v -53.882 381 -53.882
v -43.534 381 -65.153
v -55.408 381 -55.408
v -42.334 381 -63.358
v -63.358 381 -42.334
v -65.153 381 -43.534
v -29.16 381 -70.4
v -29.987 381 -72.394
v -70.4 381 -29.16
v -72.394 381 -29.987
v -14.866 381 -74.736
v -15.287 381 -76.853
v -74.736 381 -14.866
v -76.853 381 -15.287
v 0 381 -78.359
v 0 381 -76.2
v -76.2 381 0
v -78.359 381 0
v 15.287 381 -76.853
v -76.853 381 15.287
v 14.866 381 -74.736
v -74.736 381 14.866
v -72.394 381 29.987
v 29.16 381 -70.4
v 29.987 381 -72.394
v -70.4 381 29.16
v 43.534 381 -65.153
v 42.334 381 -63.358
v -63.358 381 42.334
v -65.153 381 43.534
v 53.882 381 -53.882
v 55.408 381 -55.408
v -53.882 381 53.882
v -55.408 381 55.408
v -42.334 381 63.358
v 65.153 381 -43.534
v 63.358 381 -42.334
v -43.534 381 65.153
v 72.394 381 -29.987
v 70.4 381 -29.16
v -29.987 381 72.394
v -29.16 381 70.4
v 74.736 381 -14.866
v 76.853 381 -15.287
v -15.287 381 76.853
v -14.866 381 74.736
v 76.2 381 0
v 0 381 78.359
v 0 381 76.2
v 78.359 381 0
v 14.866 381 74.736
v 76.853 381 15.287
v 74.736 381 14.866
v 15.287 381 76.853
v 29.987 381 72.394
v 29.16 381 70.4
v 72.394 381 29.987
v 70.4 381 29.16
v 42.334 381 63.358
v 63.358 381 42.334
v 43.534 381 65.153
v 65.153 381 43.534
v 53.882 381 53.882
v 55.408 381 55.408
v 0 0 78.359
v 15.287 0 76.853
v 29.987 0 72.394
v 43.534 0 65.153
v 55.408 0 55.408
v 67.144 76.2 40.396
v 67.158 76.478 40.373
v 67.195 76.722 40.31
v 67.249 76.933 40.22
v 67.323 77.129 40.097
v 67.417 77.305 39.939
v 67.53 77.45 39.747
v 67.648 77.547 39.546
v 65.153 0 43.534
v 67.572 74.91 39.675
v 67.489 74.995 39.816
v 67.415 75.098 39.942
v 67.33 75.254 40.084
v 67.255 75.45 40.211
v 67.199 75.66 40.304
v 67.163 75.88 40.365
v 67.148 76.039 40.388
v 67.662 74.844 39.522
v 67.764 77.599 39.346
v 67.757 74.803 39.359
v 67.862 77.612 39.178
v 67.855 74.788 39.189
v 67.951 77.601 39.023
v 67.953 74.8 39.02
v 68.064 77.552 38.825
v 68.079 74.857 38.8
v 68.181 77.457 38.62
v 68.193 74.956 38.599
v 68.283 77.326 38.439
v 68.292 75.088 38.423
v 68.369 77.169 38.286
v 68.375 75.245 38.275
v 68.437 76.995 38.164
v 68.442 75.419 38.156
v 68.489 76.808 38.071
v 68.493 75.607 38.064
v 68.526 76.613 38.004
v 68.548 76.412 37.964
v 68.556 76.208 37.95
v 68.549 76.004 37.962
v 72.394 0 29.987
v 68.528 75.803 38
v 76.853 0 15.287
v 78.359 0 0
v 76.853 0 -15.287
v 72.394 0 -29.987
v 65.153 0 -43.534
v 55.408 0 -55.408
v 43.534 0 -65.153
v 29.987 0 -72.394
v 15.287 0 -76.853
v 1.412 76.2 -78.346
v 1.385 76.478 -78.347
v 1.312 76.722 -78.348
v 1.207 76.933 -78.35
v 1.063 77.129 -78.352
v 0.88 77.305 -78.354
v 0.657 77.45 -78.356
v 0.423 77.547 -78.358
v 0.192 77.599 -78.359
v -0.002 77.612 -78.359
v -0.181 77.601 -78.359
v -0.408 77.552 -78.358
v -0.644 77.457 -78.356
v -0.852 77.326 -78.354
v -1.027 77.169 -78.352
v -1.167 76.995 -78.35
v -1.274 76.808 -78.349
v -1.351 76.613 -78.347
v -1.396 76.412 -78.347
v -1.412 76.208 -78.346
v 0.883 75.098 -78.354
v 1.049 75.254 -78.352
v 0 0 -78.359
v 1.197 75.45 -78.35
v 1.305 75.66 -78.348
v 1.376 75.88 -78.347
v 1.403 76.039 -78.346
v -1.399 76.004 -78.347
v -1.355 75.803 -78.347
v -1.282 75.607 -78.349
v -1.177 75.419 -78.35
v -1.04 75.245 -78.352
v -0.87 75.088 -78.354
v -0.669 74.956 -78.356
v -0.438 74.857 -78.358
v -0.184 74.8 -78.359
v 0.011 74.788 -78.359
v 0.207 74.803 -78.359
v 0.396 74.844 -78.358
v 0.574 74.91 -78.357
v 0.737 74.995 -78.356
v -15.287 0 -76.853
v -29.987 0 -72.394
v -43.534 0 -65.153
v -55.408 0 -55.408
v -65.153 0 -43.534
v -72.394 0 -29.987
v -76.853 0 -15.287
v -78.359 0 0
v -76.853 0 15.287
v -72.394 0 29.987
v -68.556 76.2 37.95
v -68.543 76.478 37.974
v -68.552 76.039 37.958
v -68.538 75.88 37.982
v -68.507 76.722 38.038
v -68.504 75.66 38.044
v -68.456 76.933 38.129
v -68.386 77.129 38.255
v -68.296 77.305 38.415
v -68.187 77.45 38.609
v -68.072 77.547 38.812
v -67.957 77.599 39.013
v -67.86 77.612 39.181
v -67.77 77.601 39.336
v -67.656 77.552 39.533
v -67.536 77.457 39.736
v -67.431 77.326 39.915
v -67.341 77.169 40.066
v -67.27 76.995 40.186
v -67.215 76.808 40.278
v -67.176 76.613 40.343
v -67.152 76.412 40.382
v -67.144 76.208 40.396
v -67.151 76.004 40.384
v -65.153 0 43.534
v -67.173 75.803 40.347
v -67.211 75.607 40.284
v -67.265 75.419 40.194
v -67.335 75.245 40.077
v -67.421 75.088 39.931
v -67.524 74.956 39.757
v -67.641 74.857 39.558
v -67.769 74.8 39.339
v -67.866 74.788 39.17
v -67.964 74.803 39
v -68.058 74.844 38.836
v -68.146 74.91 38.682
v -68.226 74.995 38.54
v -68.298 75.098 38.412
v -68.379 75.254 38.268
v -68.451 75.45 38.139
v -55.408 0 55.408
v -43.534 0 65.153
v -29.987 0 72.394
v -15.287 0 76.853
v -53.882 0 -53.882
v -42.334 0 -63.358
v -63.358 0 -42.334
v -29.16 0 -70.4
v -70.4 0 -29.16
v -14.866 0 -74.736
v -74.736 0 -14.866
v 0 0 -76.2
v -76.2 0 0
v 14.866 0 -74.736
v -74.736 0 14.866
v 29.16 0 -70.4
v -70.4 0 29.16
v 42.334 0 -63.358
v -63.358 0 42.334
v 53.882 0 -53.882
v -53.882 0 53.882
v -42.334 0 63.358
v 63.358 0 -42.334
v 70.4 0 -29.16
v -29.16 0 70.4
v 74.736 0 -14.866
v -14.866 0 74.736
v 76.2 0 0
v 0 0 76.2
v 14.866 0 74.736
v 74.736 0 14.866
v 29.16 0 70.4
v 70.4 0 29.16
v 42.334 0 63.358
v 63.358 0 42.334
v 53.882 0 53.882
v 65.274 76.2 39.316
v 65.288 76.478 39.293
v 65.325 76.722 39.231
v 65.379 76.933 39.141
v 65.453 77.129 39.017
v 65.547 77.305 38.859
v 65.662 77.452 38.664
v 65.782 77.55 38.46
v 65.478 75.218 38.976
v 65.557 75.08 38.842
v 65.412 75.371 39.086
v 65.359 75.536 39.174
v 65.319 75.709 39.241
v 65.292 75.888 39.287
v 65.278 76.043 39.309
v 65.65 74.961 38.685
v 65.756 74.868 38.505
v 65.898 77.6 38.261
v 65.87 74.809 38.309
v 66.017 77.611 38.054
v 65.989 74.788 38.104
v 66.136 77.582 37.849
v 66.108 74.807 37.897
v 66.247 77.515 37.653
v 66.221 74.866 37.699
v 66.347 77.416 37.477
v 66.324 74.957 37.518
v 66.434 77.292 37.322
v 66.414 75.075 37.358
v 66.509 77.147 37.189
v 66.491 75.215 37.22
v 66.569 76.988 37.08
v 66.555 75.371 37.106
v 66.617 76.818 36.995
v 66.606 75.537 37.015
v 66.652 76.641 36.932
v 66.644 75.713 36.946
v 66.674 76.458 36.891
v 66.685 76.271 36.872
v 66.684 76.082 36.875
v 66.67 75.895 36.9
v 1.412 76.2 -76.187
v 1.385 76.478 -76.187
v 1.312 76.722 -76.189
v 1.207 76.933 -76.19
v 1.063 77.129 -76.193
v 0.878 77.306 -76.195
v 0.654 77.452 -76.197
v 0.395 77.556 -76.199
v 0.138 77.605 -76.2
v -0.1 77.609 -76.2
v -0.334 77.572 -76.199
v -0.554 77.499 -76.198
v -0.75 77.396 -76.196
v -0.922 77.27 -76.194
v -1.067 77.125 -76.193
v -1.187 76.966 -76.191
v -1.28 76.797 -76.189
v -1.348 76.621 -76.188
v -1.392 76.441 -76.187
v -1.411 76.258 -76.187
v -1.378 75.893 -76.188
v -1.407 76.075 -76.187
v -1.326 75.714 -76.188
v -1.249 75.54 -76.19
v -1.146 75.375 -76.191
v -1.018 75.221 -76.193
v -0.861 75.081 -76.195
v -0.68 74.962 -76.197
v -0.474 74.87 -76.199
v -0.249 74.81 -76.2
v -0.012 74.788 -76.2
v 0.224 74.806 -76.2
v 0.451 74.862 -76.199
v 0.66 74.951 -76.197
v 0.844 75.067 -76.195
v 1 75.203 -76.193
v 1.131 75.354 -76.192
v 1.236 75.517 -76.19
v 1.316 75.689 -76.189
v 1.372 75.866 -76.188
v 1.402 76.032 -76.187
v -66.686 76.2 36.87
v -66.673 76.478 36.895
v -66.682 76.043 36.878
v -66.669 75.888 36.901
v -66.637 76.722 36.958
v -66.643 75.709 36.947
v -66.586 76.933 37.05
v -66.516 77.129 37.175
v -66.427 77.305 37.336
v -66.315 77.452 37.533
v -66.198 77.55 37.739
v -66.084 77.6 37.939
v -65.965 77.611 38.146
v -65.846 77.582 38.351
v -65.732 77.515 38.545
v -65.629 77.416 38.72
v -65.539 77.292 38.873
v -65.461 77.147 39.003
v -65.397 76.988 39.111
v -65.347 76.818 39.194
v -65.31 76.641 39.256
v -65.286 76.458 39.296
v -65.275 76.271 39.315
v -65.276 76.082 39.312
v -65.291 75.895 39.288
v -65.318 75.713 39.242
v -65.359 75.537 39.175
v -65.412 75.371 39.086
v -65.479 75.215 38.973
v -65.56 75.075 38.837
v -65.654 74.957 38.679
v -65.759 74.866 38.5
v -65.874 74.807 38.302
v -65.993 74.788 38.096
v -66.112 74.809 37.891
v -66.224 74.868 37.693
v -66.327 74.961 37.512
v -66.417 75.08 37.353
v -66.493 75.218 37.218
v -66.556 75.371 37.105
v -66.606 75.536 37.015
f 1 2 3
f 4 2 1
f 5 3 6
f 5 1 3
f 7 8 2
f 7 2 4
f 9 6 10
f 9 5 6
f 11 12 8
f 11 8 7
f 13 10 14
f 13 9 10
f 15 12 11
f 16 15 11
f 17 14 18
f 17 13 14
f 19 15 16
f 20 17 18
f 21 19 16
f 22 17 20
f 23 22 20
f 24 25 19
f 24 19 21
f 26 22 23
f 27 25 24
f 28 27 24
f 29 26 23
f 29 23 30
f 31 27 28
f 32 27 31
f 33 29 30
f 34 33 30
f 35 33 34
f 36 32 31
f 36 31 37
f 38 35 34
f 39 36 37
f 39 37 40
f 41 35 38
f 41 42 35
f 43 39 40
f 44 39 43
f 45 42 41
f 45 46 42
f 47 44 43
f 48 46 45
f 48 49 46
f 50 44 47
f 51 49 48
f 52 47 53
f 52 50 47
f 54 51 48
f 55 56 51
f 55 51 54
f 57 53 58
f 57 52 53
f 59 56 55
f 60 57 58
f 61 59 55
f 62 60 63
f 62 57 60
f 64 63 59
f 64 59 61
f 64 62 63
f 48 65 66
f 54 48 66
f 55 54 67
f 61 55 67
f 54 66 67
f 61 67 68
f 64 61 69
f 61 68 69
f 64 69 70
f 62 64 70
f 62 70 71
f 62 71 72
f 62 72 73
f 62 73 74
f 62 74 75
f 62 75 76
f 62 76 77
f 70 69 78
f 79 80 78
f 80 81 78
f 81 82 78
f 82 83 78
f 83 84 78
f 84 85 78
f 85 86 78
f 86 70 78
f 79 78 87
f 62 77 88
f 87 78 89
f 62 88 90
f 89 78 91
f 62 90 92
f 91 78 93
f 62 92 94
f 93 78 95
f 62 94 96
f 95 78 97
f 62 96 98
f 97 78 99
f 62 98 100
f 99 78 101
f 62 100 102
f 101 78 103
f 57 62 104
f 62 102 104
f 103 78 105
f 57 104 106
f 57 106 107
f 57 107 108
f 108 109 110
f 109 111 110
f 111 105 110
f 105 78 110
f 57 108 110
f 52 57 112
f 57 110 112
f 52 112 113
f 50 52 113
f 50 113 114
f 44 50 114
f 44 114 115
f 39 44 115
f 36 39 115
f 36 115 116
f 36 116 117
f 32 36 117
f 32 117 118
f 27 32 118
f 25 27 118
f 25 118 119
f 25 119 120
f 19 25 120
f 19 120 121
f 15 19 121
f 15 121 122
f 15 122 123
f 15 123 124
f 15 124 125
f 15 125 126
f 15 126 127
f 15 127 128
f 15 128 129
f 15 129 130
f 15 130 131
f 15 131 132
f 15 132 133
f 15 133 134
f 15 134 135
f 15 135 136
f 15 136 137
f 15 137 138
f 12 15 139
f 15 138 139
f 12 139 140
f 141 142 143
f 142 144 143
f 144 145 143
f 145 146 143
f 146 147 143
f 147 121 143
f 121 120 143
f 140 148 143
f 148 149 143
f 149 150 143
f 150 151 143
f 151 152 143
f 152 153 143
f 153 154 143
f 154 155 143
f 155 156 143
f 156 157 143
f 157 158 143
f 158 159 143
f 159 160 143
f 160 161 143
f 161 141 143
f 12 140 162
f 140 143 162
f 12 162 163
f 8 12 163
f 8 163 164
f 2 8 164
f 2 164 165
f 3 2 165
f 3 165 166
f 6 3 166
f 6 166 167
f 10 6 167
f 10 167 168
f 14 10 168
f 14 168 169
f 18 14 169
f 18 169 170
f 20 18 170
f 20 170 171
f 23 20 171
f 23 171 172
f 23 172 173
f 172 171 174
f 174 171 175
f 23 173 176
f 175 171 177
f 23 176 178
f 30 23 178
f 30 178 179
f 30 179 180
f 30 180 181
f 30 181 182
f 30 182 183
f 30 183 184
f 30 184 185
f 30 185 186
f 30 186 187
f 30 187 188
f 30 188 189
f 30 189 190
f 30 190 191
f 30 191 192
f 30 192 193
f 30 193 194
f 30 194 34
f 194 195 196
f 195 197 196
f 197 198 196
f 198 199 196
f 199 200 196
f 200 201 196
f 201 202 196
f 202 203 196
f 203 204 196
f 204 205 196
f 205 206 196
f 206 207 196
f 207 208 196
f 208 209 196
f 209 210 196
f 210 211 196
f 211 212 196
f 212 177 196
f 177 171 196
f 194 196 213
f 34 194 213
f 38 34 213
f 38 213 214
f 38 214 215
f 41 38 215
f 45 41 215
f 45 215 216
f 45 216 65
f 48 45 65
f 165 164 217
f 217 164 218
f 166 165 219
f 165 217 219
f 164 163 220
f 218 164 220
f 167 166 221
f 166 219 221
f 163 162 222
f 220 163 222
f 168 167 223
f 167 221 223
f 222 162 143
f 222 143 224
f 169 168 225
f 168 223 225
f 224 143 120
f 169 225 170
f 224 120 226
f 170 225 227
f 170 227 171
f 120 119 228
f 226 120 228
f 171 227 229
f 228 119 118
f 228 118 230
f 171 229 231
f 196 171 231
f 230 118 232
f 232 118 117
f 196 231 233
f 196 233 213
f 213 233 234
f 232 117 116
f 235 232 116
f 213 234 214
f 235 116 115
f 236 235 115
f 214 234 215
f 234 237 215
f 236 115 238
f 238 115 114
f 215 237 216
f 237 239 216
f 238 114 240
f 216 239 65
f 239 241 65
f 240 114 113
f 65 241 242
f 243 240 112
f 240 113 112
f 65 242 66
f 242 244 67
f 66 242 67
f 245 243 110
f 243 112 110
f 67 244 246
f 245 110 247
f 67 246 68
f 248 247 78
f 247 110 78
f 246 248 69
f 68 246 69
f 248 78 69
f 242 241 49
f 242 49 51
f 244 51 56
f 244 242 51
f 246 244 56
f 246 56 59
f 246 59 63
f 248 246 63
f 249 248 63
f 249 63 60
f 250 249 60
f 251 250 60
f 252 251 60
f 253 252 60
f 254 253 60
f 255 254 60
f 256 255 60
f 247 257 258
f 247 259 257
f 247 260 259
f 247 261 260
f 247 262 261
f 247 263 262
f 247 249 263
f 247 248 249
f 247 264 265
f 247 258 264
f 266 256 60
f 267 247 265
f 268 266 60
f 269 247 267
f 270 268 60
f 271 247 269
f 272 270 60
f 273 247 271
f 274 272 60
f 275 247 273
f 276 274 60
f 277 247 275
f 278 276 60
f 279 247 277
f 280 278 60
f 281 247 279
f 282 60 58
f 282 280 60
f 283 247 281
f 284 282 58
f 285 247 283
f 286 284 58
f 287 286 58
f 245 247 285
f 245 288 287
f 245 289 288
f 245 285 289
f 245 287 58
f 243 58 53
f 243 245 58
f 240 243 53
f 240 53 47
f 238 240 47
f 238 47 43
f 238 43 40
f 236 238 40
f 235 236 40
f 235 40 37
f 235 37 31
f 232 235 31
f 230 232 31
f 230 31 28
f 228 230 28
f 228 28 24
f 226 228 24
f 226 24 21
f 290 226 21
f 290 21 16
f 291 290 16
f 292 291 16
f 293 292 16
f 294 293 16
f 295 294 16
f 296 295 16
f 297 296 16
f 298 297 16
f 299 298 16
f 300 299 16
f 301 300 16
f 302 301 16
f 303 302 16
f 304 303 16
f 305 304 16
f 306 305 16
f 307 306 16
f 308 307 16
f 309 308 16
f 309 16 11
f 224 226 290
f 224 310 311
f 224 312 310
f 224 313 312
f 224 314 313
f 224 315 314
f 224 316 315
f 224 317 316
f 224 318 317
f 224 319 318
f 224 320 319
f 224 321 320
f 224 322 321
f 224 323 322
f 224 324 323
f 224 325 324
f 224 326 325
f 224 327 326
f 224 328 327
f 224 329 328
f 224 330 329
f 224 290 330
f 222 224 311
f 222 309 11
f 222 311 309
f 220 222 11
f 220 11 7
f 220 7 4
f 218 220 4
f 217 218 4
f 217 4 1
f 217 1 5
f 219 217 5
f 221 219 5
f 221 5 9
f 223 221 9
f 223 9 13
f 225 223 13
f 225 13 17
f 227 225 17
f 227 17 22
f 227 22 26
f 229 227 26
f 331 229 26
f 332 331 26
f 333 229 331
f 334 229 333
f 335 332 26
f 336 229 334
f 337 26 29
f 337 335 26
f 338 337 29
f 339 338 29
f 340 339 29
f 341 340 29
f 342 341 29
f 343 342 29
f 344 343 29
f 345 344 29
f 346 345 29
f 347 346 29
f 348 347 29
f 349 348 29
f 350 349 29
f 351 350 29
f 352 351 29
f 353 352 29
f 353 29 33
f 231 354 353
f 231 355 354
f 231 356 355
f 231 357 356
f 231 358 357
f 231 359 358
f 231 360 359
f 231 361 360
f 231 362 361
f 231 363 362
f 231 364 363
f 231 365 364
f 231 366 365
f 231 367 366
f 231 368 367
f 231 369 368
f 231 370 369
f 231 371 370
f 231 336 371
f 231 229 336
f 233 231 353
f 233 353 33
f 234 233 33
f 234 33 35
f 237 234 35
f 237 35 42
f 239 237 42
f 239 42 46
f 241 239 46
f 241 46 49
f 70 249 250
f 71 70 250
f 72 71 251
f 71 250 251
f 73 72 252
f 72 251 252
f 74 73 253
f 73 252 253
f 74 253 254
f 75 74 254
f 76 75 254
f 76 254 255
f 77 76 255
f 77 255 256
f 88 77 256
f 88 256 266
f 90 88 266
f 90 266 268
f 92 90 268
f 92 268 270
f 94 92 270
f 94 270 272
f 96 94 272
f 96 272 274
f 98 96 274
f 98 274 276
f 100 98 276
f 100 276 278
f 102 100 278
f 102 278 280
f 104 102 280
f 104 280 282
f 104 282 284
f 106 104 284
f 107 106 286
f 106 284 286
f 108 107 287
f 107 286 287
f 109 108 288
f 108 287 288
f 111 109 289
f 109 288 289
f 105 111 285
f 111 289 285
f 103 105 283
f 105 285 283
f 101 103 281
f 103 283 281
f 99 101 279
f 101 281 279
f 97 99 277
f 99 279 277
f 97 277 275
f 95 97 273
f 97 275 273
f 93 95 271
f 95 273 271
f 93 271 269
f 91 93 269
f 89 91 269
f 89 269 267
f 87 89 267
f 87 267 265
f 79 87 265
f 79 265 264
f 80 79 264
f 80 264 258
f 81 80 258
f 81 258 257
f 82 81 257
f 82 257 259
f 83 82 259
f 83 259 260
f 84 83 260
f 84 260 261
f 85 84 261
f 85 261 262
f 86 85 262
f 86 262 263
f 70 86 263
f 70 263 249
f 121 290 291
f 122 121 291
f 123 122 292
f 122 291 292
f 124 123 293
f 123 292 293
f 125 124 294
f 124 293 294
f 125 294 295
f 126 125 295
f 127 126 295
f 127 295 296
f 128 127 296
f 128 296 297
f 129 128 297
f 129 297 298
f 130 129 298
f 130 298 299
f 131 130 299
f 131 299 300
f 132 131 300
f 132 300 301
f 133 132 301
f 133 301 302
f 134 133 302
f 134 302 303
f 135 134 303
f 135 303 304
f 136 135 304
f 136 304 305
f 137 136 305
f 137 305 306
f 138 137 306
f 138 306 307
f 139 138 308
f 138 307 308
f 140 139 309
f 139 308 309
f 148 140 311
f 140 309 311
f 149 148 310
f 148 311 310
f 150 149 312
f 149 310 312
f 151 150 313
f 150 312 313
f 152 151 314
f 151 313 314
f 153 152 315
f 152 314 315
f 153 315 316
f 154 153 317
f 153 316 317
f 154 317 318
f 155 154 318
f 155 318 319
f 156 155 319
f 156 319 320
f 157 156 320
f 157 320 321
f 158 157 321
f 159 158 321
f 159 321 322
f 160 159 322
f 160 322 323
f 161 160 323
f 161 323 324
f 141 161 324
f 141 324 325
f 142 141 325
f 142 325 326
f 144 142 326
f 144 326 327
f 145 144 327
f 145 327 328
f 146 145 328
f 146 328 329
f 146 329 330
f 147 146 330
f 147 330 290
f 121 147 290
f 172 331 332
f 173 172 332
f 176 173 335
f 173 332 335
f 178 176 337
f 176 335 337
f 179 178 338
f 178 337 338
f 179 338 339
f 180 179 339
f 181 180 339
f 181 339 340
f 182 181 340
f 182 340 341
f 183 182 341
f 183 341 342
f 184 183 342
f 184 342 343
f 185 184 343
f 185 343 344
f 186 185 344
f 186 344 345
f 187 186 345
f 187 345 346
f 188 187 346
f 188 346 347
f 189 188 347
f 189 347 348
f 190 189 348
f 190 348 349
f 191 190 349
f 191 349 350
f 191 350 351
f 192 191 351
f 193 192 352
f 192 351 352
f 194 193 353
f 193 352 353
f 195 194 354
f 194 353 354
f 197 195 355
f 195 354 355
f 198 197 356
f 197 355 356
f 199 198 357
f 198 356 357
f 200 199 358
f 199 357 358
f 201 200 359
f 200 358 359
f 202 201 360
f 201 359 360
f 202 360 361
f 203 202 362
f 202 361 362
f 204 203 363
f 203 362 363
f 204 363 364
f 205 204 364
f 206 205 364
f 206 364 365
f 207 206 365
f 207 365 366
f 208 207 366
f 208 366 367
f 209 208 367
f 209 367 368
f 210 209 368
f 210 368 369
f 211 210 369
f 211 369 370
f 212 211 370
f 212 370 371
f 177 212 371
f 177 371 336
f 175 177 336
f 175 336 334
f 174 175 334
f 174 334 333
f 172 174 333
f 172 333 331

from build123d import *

# Parameters (mm, degrees)
SKETCH1_R               = 78.359
SKETCH1_R_2             = 76.2
BOSS_EXTRUDE1_DEPTH     = 381
CUT_EXTRUDE1_REACH      = 398.789
CUT_EXTRUDE1_END_RADIUS = 78.359
SKETCH2_R               = 1.41224
CIRPATTERN1_COUNT       = 3


with BuildPart() as part:
    # Sketch1 → Boss-Extrude1 (new body)
    with BuildSketch(Plane(origin=(0, 0, 0), x_dir=(1, 0, 0), z_dir=(0, 1, 0))):
        with Locations(Location((0, 0, 0), (0, 0, 270))):
            Circle(SKETCH1_R)
        with Locations(Location((0, 0, 0), (0, 0, 270))):
            Circle(SKETCH1_R_2, mode=Mode.SUBTRACT)
    extrude(amount=BOSS_EXTRUDE1_DEPTH)

    # Cut-Extrude1: up to this cylinder (the profile starts inside it)
    cut_extrude1_end = Plane(origin=(0, 76.2, 0), z_dir=(0, -1, 0)) * Cylinder(CUT_EXTRUDE1_END_RADIUS, 955.296, mode=Mode.PRIVATE)
    # Sketch2 → Cut-Extrude1 (cut, up to the surface)
    with BuildSketch(Plane.XY, mode=Mode.PRIVATE) as cut_extrude1_sk1:
        with Locations((0, 76.2)):
            Circle(SKETCH2_R)
    cut_extrude1_tool1 = extrude(cut_extrude1_sk1.sketch, amount=-CUT_EXTRUDE1_REACH, mode=Mode.PRIVATE) & cut_extrude1_end
    cut_extrude1 = cut_extrude1_tool1.solids().sort_by_distance((0, 76.2, 0))[0]
    add(cut_extrude1, mode=Mode.SUBTRACT)

    # CirPattern1: Cut-Extrude1 ×3 about axis
    cirpattern1_axis = Axis((0, 0, 0), (0, 1, 0))
    for i in range(1, CIRPATTERN1_COUNT):
        add(cut_extrude1.rotate(cirpattern1_axis, i * 360 / CIRPATTERN1_COUNT), mode=Mode.SUBTRACT)


solid = part.part
